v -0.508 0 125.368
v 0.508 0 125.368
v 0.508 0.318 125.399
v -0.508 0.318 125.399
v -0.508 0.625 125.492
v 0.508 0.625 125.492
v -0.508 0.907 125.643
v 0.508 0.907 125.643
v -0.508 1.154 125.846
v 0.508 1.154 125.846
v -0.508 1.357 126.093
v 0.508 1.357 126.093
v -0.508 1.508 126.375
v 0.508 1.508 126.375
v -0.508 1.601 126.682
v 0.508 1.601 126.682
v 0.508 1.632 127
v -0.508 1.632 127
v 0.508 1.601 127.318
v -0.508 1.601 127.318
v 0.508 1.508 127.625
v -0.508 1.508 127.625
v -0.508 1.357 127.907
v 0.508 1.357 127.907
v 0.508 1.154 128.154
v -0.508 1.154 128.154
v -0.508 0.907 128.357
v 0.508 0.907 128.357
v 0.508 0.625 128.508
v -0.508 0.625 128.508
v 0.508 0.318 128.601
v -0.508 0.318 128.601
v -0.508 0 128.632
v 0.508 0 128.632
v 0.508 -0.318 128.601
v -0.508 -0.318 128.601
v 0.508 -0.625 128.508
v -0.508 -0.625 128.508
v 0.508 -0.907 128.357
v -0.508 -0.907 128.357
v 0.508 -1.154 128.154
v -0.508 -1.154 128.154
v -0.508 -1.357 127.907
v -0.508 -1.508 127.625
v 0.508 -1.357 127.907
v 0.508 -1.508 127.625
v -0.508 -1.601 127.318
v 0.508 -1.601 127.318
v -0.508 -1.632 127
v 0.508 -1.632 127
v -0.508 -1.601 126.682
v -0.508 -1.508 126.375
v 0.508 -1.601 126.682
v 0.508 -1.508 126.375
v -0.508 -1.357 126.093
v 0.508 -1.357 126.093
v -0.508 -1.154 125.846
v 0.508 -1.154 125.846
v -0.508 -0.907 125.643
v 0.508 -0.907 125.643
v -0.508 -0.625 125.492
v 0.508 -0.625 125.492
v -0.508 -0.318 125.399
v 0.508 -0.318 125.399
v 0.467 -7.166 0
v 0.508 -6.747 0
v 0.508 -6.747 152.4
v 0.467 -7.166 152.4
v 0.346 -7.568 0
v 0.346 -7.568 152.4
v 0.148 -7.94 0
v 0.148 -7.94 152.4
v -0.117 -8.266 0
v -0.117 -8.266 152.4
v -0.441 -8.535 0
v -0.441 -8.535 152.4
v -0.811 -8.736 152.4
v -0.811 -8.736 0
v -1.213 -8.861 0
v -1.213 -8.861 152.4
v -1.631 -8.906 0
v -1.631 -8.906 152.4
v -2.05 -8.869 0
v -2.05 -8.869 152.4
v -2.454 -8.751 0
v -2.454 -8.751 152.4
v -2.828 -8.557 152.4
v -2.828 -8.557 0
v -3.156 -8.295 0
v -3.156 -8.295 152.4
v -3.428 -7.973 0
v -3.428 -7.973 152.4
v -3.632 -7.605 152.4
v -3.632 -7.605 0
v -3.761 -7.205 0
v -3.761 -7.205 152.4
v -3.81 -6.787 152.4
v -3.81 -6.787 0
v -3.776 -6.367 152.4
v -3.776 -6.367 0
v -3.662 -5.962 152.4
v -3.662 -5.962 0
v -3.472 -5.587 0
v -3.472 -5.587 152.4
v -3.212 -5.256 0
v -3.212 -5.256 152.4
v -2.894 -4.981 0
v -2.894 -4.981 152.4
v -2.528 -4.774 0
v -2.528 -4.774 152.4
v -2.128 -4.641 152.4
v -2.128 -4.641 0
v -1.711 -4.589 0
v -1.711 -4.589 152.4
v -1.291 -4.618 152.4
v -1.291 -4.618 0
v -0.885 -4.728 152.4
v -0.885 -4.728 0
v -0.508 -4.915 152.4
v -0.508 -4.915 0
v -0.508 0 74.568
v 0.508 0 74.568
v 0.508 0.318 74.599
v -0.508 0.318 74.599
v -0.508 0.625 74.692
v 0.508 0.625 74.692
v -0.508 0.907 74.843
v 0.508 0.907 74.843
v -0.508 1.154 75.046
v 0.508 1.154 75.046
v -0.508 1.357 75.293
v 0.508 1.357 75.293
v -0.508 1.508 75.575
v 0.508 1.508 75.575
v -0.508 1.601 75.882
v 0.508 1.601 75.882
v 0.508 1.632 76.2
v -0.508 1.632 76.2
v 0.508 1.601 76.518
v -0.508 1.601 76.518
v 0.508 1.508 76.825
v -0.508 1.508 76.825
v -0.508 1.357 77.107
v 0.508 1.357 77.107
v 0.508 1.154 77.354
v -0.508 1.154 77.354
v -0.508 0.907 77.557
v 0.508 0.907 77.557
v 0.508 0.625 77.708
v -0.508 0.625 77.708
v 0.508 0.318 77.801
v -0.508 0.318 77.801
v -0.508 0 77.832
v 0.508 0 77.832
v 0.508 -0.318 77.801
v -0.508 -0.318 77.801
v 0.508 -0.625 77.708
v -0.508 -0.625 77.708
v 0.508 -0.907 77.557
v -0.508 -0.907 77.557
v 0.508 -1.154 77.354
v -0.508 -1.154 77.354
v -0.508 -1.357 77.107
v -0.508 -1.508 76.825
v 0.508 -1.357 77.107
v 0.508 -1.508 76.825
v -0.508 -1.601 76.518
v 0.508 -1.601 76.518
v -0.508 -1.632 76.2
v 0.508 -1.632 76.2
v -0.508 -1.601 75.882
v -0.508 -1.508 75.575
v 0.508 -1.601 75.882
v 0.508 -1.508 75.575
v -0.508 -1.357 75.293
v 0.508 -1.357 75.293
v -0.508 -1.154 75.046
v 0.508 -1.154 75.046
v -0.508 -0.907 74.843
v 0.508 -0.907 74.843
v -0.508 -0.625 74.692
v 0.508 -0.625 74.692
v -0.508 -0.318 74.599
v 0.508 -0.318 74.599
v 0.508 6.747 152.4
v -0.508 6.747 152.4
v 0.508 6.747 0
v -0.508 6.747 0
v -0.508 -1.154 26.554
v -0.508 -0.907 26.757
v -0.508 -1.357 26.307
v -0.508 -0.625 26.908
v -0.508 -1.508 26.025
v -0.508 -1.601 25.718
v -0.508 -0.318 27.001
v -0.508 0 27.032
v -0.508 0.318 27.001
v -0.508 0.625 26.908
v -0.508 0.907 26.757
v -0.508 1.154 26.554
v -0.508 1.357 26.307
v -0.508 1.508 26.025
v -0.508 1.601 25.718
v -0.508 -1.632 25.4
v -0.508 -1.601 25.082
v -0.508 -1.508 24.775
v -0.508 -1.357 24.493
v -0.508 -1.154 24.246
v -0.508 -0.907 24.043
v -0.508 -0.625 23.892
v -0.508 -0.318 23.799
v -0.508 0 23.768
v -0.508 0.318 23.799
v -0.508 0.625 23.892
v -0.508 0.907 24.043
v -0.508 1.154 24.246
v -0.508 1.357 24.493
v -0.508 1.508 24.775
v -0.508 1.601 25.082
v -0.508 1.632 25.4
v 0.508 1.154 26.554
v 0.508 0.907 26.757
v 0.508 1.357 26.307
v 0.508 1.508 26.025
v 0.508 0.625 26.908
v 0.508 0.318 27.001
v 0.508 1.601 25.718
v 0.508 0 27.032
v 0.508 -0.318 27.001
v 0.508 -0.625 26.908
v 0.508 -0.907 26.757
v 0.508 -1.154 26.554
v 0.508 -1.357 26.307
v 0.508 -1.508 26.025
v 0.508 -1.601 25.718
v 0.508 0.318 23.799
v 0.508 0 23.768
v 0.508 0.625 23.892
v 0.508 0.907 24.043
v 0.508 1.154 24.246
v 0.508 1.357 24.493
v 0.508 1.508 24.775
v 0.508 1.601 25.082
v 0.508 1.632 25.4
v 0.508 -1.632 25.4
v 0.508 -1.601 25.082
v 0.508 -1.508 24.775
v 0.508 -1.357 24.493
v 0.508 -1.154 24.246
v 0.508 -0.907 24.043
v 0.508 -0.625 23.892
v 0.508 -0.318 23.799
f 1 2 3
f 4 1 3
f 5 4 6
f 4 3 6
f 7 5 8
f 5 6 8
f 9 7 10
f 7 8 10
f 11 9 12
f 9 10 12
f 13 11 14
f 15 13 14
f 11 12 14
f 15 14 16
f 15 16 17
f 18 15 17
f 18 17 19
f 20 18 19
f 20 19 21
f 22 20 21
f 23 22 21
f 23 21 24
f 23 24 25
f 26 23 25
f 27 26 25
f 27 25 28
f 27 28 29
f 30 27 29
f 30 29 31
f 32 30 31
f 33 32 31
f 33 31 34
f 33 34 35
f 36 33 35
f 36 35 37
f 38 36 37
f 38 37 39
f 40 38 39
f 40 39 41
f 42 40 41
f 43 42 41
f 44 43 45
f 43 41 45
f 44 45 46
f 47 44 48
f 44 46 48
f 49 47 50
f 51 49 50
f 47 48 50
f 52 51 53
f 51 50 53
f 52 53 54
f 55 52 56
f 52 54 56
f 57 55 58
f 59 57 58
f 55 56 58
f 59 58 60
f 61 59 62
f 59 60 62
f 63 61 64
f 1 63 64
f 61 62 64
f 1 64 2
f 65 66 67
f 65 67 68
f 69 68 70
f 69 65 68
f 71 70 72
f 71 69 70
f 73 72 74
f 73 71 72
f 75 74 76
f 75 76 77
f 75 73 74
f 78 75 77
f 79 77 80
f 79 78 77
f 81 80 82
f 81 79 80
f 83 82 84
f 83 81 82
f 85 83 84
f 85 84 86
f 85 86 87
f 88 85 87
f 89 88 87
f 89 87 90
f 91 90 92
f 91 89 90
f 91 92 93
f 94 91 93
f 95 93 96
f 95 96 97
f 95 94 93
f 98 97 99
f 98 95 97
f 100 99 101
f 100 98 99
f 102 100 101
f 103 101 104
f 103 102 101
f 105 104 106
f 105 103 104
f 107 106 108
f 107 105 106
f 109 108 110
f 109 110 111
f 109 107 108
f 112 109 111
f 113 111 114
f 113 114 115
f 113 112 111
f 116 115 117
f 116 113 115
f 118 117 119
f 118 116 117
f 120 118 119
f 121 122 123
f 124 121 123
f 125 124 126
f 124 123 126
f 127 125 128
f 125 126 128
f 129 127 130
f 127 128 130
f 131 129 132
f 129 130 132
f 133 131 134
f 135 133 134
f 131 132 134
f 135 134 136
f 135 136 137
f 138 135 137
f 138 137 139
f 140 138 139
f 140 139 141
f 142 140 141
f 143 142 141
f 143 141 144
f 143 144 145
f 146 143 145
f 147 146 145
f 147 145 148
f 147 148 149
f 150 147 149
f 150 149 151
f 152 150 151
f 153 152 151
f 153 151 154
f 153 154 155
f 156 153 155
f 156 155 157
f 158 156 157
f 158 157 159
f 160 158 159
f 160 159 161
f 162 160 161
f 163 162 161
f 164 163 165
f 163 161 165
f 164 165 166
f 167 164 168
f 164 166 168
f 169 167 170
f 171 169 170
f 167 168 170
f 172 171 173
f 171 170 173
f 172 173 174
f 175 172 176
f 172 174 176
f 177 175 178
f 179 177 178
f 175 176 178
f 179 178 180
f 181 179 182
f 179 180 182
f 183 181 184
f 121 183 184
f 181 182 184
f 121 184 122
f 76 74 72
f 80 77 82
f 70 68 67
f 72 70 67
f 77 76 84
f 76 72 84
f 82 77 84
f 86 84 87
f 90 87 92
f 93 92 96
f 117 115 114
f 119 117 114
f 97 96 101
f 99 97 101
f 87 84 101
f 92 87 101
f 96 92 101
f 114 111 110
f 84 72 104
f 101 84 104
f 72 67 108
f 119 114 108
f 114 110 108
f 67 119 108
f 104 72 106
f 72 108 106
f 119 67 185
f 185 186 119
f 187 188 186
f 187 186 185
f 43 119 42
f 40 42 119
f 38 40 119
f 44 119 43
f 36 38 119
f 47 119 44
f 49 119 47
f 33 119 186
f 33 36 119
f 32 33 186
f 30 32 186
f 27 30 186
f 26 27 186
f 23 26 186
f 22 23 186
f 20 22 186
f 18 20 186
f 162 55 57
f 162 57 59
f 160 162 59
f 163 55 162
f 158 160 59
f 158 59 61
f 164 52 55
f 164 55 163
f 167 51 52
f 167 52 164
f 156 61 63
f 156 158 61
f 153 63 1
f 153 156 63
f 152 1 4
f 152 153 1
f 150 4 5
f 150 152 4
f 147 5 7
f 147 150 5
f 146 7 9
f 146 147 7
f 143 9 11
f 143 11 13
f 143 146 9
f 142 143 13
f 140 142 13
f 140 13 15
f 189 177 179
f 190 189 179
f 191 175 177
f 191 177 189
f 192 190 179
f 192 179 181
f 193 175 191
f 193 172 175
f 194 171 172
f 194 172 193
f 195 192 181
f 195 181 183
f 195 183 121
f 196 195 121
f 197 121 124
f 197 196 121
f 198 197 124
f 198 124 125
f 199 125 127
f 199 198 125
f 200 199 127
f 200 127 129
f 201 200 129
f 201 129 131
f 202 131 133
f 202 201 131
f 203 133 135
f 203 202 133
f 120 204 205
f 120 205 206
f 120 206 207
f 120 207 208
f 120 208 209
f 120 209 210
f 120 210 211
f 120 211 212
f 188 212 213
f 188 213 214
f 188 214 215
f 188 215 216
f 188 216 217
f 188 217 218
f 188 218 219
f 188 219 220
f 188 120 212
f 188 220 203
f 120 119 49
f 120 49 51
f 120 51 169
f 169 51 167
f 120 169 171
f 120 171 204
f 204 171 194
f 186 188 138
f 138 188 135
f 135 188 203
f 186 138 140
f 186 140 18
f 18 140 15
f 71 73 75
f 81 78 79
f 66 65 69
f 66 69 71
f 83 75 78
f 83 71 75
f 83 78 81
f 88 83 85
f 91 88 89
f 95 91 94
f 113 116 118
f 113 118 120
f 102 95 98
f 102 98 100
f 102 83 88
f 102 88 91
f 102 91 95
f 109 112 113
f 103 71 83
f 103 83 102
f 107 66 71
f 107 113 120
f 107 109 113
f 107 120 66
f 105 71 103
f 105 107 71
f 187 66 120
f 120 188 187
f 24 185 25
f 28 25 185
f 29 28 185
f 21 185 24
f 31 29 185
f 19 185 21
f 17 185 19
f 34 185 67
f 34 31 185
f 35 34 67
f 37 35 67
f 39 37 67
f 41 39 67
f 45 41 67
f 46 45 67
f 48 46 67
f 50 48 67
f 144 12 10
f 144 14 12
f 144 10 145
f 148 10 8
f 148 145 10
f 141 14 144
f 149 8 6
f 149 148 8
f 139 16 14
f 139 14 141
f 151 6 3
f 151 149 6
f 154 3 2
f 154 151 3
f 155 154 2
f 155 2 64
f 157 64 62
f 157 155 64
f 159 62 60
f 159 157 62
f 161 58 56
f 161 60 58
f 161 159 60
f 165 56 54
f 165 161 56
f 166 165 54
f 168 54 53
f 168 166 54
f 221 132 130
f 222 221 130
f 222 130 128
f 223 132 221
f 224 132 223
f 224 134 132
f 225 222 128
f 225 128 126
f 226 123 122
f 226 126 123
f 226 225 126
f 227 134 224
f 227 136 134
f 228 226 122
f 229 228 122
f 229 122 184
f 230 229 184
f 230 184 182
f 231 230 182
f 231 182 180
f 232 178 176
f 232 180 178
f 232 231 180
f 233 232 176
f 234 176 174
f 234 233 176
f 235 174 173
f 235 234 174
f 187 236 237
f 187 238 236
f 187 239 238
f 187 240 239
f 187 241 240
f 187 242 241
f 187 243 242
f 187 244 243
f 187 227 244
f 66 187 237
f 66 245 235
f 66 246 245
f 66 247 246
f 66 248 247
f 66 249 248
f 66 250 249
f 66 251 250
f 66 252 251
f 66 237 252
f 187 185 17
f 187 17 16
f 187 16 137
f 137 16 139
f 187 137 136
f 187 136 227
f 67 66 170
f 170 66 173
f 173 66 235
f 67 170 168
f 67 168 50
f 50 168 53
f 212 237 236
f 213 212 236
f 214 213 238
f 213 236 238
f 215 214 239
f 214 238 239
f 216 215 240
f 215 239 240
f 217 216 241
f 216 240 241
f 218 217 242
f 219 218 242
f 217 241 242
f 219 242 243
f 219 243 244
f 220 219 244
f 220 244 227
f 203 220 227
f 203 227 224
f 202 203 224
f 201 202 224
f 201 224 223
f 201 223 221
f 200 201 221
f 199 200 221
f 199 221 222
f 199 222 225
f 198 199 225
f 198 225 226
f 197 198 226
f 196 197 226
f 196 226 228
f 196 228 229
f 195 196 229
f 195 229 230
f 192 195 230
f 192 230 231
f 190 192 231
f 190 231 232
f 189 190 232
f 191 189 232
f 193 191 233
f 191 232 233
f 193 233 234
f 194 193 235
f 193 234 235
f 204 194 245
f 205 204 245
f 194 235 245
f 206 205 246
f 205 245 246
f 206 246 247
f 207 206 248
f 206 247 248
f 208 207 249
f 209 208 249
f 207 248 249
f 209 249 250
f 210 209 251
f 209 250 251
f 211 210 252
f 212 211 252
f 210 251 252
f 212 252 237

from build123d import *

# Parameters (mm, degrees)
BOSS_EXTRUDE2_DEPTH       = 152.4
F_4_CLEARANCE_HOLE1_D     = 3.2639
F_4_CLEARANCE_HOLE1_DEPTH = 1.524
F_4_CLEARANCE_HOLE1_TIP   = 0.980574487


with BuildPart() as part:
    # Sketch2 → Boss-Extrude2 (new body)
    with BuildSketch(Plane.XY):
        with BuildLine():
            Line((-0.508, -4.915254952), (-0.508, 6.746875))
            Line((-0.508, 6.746875), (0.508, 6.746875))
            Line((0.508, 6.746875), (0.508, -6.746875))
            ThreePointArc((0.508, -6.746875), (-3.538990731, -7.794143829), (-0.508, -4.915254952))
        make_face()
    extrude(amount=BOSS_EXTRUDE2_DEPTH)

    # #4 Clearance Hole1
    with Locations(Plane.ZY.offset(0.508)):
        with Locations((25.4, 0), (76.2, 0), (127, 0)):
            Hole(F_4_CLEARANCE_HOLE1_D / 2, depth=F_4_CLEARANCE_HOLE1_DEPTH)
            with Locations((0, 0, -(F_4_CLEARANCE_HOLE1_DEPTH + F_4_CLEARANCE_HOLE1_TIP / 2))):  # 118° drill point
                Cone(0, F_4_CLEARANCE_HOLE1_D / 2, F_4_CLEARANCE_HOLE1_TIP, mode=Mode.SUBTRACT)


solid = part.part
